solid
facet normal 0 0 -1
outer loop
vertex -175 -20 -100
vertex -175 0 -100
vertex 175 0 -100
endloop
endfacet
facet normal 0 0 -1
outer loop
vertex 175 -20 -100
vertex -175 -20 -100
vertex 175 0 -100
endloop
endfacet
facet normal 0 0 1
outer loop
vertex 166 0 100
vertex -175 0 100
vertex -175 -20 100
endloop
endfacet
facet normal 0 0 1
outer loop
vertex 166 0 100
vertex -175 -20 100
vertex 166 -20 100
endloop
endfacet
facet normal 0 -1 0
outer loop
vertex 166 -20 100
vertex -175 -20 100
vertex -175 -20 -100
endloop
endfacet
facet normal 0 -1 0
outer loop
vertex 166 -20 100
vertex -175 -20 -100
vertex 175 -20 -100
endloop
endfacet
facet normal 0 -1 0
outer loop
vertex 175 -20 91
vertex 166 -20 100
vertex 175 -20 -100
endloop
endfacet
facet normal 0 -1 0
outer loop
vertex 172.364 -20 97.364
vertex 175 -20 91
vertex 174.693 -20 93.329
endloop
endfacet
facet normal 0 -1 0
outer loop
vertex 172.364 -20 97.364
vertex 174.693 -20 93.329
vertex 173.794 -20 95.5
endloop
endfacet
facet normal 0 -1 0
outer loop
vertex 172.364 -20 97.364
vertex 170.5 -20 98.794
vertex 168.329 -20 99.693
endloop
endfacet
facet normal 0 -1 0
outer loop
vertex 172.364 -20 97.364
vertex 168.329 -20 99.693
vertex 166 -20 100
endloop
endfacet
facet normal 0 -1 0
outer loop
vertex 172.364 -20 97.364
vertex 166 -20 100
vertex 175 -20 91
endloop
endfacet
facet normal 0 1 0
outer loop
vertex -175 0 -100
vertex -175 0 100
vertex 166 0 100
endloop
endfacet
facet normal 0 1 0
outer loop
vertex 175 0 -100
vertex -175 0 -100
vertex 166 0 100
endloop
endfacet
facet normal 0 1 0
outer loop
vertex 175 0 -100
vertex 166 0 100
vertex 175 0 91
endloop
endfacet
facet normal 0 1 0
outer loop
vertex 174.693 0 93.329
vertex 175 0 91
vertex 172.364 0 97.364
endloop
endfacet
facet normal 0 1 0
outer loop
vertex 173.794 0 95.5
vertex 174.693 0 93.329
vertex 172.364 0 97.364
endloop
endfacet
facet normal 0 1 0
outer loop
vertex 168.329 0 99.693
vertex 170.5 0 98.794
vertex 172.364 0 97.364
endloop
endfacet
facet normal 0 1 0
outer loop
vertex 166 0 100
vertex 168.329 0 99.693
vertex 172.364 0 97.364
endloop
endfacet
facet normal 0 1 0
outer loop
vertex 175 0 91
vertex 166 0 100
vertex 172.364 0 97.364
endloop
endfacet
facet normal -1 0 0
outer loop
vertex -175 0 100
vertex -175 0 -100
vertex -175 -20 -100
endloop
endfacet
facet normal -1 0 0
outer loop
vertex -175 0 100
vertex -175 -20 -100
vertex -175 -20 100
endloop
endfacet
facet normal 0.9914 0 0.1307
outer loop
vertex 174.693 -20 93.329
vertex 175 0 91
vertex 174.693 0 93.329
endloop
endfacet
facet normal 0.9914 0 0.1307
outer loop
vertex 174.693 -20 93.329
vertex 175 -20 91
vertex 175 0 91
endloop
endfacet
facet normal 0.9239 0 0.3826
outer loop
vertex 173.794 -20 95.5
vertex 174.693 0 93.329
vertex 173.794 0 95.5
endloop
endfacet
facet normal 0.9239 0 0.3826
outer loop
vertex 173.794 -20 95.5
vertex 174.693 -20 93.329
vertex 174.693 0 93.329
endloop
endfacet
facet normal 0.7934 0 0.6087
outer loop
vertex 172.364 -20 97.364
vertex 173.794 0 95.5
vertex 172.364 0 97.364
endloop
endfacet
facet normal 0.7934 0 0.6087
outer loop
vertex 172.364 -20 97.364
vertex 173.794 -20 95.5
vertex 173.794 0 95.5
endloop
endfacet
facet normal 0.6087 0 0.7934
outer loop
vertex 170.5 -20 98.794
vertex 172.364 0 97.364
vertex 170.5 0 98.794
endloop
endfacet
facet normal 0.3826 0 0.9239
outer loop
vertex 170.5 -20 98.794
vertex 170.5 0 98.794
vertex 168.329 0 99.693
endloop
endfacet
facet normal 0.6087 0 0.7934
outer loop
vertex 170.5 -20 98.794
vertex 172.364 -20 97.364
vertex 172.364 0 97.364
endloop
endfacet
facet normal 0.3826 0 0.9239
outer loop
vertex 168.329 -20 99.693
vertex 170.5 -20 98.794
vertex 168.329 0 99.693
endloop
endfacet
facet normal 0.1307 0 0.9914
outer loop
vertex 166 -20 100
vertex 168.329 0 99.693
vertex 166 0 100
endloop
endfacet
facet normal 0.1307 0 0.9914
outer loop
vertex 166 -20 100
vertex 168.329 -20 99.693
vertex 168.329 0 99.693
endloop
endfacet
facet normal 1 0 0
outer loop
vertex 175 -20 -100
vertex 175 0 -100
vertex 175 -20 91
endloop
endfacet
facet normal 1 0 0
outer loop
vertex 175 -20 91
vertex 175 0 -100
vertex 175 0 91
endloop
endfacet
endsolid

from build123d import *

# Parameters (mm, degrees)
F0_W     = 350
F0_H     = 200
F1_DEPTH = 20
F2_R     = 9


with BuildPart() as f1:
    # F0 (on Front) → F1 (new body)
    with BuildSketch(Plane.XZ):
        Rectangle(F0_W, F0_H)
    extrude(amount=F1_DEPTH)

    # F2
    f2_edges = [f1.edges().sort_by_distance(p)[0] for p in [
        (175, -10, 100),
    ]]
    fillet(f2_edges, radius=F2_R)


solid = f1.part
